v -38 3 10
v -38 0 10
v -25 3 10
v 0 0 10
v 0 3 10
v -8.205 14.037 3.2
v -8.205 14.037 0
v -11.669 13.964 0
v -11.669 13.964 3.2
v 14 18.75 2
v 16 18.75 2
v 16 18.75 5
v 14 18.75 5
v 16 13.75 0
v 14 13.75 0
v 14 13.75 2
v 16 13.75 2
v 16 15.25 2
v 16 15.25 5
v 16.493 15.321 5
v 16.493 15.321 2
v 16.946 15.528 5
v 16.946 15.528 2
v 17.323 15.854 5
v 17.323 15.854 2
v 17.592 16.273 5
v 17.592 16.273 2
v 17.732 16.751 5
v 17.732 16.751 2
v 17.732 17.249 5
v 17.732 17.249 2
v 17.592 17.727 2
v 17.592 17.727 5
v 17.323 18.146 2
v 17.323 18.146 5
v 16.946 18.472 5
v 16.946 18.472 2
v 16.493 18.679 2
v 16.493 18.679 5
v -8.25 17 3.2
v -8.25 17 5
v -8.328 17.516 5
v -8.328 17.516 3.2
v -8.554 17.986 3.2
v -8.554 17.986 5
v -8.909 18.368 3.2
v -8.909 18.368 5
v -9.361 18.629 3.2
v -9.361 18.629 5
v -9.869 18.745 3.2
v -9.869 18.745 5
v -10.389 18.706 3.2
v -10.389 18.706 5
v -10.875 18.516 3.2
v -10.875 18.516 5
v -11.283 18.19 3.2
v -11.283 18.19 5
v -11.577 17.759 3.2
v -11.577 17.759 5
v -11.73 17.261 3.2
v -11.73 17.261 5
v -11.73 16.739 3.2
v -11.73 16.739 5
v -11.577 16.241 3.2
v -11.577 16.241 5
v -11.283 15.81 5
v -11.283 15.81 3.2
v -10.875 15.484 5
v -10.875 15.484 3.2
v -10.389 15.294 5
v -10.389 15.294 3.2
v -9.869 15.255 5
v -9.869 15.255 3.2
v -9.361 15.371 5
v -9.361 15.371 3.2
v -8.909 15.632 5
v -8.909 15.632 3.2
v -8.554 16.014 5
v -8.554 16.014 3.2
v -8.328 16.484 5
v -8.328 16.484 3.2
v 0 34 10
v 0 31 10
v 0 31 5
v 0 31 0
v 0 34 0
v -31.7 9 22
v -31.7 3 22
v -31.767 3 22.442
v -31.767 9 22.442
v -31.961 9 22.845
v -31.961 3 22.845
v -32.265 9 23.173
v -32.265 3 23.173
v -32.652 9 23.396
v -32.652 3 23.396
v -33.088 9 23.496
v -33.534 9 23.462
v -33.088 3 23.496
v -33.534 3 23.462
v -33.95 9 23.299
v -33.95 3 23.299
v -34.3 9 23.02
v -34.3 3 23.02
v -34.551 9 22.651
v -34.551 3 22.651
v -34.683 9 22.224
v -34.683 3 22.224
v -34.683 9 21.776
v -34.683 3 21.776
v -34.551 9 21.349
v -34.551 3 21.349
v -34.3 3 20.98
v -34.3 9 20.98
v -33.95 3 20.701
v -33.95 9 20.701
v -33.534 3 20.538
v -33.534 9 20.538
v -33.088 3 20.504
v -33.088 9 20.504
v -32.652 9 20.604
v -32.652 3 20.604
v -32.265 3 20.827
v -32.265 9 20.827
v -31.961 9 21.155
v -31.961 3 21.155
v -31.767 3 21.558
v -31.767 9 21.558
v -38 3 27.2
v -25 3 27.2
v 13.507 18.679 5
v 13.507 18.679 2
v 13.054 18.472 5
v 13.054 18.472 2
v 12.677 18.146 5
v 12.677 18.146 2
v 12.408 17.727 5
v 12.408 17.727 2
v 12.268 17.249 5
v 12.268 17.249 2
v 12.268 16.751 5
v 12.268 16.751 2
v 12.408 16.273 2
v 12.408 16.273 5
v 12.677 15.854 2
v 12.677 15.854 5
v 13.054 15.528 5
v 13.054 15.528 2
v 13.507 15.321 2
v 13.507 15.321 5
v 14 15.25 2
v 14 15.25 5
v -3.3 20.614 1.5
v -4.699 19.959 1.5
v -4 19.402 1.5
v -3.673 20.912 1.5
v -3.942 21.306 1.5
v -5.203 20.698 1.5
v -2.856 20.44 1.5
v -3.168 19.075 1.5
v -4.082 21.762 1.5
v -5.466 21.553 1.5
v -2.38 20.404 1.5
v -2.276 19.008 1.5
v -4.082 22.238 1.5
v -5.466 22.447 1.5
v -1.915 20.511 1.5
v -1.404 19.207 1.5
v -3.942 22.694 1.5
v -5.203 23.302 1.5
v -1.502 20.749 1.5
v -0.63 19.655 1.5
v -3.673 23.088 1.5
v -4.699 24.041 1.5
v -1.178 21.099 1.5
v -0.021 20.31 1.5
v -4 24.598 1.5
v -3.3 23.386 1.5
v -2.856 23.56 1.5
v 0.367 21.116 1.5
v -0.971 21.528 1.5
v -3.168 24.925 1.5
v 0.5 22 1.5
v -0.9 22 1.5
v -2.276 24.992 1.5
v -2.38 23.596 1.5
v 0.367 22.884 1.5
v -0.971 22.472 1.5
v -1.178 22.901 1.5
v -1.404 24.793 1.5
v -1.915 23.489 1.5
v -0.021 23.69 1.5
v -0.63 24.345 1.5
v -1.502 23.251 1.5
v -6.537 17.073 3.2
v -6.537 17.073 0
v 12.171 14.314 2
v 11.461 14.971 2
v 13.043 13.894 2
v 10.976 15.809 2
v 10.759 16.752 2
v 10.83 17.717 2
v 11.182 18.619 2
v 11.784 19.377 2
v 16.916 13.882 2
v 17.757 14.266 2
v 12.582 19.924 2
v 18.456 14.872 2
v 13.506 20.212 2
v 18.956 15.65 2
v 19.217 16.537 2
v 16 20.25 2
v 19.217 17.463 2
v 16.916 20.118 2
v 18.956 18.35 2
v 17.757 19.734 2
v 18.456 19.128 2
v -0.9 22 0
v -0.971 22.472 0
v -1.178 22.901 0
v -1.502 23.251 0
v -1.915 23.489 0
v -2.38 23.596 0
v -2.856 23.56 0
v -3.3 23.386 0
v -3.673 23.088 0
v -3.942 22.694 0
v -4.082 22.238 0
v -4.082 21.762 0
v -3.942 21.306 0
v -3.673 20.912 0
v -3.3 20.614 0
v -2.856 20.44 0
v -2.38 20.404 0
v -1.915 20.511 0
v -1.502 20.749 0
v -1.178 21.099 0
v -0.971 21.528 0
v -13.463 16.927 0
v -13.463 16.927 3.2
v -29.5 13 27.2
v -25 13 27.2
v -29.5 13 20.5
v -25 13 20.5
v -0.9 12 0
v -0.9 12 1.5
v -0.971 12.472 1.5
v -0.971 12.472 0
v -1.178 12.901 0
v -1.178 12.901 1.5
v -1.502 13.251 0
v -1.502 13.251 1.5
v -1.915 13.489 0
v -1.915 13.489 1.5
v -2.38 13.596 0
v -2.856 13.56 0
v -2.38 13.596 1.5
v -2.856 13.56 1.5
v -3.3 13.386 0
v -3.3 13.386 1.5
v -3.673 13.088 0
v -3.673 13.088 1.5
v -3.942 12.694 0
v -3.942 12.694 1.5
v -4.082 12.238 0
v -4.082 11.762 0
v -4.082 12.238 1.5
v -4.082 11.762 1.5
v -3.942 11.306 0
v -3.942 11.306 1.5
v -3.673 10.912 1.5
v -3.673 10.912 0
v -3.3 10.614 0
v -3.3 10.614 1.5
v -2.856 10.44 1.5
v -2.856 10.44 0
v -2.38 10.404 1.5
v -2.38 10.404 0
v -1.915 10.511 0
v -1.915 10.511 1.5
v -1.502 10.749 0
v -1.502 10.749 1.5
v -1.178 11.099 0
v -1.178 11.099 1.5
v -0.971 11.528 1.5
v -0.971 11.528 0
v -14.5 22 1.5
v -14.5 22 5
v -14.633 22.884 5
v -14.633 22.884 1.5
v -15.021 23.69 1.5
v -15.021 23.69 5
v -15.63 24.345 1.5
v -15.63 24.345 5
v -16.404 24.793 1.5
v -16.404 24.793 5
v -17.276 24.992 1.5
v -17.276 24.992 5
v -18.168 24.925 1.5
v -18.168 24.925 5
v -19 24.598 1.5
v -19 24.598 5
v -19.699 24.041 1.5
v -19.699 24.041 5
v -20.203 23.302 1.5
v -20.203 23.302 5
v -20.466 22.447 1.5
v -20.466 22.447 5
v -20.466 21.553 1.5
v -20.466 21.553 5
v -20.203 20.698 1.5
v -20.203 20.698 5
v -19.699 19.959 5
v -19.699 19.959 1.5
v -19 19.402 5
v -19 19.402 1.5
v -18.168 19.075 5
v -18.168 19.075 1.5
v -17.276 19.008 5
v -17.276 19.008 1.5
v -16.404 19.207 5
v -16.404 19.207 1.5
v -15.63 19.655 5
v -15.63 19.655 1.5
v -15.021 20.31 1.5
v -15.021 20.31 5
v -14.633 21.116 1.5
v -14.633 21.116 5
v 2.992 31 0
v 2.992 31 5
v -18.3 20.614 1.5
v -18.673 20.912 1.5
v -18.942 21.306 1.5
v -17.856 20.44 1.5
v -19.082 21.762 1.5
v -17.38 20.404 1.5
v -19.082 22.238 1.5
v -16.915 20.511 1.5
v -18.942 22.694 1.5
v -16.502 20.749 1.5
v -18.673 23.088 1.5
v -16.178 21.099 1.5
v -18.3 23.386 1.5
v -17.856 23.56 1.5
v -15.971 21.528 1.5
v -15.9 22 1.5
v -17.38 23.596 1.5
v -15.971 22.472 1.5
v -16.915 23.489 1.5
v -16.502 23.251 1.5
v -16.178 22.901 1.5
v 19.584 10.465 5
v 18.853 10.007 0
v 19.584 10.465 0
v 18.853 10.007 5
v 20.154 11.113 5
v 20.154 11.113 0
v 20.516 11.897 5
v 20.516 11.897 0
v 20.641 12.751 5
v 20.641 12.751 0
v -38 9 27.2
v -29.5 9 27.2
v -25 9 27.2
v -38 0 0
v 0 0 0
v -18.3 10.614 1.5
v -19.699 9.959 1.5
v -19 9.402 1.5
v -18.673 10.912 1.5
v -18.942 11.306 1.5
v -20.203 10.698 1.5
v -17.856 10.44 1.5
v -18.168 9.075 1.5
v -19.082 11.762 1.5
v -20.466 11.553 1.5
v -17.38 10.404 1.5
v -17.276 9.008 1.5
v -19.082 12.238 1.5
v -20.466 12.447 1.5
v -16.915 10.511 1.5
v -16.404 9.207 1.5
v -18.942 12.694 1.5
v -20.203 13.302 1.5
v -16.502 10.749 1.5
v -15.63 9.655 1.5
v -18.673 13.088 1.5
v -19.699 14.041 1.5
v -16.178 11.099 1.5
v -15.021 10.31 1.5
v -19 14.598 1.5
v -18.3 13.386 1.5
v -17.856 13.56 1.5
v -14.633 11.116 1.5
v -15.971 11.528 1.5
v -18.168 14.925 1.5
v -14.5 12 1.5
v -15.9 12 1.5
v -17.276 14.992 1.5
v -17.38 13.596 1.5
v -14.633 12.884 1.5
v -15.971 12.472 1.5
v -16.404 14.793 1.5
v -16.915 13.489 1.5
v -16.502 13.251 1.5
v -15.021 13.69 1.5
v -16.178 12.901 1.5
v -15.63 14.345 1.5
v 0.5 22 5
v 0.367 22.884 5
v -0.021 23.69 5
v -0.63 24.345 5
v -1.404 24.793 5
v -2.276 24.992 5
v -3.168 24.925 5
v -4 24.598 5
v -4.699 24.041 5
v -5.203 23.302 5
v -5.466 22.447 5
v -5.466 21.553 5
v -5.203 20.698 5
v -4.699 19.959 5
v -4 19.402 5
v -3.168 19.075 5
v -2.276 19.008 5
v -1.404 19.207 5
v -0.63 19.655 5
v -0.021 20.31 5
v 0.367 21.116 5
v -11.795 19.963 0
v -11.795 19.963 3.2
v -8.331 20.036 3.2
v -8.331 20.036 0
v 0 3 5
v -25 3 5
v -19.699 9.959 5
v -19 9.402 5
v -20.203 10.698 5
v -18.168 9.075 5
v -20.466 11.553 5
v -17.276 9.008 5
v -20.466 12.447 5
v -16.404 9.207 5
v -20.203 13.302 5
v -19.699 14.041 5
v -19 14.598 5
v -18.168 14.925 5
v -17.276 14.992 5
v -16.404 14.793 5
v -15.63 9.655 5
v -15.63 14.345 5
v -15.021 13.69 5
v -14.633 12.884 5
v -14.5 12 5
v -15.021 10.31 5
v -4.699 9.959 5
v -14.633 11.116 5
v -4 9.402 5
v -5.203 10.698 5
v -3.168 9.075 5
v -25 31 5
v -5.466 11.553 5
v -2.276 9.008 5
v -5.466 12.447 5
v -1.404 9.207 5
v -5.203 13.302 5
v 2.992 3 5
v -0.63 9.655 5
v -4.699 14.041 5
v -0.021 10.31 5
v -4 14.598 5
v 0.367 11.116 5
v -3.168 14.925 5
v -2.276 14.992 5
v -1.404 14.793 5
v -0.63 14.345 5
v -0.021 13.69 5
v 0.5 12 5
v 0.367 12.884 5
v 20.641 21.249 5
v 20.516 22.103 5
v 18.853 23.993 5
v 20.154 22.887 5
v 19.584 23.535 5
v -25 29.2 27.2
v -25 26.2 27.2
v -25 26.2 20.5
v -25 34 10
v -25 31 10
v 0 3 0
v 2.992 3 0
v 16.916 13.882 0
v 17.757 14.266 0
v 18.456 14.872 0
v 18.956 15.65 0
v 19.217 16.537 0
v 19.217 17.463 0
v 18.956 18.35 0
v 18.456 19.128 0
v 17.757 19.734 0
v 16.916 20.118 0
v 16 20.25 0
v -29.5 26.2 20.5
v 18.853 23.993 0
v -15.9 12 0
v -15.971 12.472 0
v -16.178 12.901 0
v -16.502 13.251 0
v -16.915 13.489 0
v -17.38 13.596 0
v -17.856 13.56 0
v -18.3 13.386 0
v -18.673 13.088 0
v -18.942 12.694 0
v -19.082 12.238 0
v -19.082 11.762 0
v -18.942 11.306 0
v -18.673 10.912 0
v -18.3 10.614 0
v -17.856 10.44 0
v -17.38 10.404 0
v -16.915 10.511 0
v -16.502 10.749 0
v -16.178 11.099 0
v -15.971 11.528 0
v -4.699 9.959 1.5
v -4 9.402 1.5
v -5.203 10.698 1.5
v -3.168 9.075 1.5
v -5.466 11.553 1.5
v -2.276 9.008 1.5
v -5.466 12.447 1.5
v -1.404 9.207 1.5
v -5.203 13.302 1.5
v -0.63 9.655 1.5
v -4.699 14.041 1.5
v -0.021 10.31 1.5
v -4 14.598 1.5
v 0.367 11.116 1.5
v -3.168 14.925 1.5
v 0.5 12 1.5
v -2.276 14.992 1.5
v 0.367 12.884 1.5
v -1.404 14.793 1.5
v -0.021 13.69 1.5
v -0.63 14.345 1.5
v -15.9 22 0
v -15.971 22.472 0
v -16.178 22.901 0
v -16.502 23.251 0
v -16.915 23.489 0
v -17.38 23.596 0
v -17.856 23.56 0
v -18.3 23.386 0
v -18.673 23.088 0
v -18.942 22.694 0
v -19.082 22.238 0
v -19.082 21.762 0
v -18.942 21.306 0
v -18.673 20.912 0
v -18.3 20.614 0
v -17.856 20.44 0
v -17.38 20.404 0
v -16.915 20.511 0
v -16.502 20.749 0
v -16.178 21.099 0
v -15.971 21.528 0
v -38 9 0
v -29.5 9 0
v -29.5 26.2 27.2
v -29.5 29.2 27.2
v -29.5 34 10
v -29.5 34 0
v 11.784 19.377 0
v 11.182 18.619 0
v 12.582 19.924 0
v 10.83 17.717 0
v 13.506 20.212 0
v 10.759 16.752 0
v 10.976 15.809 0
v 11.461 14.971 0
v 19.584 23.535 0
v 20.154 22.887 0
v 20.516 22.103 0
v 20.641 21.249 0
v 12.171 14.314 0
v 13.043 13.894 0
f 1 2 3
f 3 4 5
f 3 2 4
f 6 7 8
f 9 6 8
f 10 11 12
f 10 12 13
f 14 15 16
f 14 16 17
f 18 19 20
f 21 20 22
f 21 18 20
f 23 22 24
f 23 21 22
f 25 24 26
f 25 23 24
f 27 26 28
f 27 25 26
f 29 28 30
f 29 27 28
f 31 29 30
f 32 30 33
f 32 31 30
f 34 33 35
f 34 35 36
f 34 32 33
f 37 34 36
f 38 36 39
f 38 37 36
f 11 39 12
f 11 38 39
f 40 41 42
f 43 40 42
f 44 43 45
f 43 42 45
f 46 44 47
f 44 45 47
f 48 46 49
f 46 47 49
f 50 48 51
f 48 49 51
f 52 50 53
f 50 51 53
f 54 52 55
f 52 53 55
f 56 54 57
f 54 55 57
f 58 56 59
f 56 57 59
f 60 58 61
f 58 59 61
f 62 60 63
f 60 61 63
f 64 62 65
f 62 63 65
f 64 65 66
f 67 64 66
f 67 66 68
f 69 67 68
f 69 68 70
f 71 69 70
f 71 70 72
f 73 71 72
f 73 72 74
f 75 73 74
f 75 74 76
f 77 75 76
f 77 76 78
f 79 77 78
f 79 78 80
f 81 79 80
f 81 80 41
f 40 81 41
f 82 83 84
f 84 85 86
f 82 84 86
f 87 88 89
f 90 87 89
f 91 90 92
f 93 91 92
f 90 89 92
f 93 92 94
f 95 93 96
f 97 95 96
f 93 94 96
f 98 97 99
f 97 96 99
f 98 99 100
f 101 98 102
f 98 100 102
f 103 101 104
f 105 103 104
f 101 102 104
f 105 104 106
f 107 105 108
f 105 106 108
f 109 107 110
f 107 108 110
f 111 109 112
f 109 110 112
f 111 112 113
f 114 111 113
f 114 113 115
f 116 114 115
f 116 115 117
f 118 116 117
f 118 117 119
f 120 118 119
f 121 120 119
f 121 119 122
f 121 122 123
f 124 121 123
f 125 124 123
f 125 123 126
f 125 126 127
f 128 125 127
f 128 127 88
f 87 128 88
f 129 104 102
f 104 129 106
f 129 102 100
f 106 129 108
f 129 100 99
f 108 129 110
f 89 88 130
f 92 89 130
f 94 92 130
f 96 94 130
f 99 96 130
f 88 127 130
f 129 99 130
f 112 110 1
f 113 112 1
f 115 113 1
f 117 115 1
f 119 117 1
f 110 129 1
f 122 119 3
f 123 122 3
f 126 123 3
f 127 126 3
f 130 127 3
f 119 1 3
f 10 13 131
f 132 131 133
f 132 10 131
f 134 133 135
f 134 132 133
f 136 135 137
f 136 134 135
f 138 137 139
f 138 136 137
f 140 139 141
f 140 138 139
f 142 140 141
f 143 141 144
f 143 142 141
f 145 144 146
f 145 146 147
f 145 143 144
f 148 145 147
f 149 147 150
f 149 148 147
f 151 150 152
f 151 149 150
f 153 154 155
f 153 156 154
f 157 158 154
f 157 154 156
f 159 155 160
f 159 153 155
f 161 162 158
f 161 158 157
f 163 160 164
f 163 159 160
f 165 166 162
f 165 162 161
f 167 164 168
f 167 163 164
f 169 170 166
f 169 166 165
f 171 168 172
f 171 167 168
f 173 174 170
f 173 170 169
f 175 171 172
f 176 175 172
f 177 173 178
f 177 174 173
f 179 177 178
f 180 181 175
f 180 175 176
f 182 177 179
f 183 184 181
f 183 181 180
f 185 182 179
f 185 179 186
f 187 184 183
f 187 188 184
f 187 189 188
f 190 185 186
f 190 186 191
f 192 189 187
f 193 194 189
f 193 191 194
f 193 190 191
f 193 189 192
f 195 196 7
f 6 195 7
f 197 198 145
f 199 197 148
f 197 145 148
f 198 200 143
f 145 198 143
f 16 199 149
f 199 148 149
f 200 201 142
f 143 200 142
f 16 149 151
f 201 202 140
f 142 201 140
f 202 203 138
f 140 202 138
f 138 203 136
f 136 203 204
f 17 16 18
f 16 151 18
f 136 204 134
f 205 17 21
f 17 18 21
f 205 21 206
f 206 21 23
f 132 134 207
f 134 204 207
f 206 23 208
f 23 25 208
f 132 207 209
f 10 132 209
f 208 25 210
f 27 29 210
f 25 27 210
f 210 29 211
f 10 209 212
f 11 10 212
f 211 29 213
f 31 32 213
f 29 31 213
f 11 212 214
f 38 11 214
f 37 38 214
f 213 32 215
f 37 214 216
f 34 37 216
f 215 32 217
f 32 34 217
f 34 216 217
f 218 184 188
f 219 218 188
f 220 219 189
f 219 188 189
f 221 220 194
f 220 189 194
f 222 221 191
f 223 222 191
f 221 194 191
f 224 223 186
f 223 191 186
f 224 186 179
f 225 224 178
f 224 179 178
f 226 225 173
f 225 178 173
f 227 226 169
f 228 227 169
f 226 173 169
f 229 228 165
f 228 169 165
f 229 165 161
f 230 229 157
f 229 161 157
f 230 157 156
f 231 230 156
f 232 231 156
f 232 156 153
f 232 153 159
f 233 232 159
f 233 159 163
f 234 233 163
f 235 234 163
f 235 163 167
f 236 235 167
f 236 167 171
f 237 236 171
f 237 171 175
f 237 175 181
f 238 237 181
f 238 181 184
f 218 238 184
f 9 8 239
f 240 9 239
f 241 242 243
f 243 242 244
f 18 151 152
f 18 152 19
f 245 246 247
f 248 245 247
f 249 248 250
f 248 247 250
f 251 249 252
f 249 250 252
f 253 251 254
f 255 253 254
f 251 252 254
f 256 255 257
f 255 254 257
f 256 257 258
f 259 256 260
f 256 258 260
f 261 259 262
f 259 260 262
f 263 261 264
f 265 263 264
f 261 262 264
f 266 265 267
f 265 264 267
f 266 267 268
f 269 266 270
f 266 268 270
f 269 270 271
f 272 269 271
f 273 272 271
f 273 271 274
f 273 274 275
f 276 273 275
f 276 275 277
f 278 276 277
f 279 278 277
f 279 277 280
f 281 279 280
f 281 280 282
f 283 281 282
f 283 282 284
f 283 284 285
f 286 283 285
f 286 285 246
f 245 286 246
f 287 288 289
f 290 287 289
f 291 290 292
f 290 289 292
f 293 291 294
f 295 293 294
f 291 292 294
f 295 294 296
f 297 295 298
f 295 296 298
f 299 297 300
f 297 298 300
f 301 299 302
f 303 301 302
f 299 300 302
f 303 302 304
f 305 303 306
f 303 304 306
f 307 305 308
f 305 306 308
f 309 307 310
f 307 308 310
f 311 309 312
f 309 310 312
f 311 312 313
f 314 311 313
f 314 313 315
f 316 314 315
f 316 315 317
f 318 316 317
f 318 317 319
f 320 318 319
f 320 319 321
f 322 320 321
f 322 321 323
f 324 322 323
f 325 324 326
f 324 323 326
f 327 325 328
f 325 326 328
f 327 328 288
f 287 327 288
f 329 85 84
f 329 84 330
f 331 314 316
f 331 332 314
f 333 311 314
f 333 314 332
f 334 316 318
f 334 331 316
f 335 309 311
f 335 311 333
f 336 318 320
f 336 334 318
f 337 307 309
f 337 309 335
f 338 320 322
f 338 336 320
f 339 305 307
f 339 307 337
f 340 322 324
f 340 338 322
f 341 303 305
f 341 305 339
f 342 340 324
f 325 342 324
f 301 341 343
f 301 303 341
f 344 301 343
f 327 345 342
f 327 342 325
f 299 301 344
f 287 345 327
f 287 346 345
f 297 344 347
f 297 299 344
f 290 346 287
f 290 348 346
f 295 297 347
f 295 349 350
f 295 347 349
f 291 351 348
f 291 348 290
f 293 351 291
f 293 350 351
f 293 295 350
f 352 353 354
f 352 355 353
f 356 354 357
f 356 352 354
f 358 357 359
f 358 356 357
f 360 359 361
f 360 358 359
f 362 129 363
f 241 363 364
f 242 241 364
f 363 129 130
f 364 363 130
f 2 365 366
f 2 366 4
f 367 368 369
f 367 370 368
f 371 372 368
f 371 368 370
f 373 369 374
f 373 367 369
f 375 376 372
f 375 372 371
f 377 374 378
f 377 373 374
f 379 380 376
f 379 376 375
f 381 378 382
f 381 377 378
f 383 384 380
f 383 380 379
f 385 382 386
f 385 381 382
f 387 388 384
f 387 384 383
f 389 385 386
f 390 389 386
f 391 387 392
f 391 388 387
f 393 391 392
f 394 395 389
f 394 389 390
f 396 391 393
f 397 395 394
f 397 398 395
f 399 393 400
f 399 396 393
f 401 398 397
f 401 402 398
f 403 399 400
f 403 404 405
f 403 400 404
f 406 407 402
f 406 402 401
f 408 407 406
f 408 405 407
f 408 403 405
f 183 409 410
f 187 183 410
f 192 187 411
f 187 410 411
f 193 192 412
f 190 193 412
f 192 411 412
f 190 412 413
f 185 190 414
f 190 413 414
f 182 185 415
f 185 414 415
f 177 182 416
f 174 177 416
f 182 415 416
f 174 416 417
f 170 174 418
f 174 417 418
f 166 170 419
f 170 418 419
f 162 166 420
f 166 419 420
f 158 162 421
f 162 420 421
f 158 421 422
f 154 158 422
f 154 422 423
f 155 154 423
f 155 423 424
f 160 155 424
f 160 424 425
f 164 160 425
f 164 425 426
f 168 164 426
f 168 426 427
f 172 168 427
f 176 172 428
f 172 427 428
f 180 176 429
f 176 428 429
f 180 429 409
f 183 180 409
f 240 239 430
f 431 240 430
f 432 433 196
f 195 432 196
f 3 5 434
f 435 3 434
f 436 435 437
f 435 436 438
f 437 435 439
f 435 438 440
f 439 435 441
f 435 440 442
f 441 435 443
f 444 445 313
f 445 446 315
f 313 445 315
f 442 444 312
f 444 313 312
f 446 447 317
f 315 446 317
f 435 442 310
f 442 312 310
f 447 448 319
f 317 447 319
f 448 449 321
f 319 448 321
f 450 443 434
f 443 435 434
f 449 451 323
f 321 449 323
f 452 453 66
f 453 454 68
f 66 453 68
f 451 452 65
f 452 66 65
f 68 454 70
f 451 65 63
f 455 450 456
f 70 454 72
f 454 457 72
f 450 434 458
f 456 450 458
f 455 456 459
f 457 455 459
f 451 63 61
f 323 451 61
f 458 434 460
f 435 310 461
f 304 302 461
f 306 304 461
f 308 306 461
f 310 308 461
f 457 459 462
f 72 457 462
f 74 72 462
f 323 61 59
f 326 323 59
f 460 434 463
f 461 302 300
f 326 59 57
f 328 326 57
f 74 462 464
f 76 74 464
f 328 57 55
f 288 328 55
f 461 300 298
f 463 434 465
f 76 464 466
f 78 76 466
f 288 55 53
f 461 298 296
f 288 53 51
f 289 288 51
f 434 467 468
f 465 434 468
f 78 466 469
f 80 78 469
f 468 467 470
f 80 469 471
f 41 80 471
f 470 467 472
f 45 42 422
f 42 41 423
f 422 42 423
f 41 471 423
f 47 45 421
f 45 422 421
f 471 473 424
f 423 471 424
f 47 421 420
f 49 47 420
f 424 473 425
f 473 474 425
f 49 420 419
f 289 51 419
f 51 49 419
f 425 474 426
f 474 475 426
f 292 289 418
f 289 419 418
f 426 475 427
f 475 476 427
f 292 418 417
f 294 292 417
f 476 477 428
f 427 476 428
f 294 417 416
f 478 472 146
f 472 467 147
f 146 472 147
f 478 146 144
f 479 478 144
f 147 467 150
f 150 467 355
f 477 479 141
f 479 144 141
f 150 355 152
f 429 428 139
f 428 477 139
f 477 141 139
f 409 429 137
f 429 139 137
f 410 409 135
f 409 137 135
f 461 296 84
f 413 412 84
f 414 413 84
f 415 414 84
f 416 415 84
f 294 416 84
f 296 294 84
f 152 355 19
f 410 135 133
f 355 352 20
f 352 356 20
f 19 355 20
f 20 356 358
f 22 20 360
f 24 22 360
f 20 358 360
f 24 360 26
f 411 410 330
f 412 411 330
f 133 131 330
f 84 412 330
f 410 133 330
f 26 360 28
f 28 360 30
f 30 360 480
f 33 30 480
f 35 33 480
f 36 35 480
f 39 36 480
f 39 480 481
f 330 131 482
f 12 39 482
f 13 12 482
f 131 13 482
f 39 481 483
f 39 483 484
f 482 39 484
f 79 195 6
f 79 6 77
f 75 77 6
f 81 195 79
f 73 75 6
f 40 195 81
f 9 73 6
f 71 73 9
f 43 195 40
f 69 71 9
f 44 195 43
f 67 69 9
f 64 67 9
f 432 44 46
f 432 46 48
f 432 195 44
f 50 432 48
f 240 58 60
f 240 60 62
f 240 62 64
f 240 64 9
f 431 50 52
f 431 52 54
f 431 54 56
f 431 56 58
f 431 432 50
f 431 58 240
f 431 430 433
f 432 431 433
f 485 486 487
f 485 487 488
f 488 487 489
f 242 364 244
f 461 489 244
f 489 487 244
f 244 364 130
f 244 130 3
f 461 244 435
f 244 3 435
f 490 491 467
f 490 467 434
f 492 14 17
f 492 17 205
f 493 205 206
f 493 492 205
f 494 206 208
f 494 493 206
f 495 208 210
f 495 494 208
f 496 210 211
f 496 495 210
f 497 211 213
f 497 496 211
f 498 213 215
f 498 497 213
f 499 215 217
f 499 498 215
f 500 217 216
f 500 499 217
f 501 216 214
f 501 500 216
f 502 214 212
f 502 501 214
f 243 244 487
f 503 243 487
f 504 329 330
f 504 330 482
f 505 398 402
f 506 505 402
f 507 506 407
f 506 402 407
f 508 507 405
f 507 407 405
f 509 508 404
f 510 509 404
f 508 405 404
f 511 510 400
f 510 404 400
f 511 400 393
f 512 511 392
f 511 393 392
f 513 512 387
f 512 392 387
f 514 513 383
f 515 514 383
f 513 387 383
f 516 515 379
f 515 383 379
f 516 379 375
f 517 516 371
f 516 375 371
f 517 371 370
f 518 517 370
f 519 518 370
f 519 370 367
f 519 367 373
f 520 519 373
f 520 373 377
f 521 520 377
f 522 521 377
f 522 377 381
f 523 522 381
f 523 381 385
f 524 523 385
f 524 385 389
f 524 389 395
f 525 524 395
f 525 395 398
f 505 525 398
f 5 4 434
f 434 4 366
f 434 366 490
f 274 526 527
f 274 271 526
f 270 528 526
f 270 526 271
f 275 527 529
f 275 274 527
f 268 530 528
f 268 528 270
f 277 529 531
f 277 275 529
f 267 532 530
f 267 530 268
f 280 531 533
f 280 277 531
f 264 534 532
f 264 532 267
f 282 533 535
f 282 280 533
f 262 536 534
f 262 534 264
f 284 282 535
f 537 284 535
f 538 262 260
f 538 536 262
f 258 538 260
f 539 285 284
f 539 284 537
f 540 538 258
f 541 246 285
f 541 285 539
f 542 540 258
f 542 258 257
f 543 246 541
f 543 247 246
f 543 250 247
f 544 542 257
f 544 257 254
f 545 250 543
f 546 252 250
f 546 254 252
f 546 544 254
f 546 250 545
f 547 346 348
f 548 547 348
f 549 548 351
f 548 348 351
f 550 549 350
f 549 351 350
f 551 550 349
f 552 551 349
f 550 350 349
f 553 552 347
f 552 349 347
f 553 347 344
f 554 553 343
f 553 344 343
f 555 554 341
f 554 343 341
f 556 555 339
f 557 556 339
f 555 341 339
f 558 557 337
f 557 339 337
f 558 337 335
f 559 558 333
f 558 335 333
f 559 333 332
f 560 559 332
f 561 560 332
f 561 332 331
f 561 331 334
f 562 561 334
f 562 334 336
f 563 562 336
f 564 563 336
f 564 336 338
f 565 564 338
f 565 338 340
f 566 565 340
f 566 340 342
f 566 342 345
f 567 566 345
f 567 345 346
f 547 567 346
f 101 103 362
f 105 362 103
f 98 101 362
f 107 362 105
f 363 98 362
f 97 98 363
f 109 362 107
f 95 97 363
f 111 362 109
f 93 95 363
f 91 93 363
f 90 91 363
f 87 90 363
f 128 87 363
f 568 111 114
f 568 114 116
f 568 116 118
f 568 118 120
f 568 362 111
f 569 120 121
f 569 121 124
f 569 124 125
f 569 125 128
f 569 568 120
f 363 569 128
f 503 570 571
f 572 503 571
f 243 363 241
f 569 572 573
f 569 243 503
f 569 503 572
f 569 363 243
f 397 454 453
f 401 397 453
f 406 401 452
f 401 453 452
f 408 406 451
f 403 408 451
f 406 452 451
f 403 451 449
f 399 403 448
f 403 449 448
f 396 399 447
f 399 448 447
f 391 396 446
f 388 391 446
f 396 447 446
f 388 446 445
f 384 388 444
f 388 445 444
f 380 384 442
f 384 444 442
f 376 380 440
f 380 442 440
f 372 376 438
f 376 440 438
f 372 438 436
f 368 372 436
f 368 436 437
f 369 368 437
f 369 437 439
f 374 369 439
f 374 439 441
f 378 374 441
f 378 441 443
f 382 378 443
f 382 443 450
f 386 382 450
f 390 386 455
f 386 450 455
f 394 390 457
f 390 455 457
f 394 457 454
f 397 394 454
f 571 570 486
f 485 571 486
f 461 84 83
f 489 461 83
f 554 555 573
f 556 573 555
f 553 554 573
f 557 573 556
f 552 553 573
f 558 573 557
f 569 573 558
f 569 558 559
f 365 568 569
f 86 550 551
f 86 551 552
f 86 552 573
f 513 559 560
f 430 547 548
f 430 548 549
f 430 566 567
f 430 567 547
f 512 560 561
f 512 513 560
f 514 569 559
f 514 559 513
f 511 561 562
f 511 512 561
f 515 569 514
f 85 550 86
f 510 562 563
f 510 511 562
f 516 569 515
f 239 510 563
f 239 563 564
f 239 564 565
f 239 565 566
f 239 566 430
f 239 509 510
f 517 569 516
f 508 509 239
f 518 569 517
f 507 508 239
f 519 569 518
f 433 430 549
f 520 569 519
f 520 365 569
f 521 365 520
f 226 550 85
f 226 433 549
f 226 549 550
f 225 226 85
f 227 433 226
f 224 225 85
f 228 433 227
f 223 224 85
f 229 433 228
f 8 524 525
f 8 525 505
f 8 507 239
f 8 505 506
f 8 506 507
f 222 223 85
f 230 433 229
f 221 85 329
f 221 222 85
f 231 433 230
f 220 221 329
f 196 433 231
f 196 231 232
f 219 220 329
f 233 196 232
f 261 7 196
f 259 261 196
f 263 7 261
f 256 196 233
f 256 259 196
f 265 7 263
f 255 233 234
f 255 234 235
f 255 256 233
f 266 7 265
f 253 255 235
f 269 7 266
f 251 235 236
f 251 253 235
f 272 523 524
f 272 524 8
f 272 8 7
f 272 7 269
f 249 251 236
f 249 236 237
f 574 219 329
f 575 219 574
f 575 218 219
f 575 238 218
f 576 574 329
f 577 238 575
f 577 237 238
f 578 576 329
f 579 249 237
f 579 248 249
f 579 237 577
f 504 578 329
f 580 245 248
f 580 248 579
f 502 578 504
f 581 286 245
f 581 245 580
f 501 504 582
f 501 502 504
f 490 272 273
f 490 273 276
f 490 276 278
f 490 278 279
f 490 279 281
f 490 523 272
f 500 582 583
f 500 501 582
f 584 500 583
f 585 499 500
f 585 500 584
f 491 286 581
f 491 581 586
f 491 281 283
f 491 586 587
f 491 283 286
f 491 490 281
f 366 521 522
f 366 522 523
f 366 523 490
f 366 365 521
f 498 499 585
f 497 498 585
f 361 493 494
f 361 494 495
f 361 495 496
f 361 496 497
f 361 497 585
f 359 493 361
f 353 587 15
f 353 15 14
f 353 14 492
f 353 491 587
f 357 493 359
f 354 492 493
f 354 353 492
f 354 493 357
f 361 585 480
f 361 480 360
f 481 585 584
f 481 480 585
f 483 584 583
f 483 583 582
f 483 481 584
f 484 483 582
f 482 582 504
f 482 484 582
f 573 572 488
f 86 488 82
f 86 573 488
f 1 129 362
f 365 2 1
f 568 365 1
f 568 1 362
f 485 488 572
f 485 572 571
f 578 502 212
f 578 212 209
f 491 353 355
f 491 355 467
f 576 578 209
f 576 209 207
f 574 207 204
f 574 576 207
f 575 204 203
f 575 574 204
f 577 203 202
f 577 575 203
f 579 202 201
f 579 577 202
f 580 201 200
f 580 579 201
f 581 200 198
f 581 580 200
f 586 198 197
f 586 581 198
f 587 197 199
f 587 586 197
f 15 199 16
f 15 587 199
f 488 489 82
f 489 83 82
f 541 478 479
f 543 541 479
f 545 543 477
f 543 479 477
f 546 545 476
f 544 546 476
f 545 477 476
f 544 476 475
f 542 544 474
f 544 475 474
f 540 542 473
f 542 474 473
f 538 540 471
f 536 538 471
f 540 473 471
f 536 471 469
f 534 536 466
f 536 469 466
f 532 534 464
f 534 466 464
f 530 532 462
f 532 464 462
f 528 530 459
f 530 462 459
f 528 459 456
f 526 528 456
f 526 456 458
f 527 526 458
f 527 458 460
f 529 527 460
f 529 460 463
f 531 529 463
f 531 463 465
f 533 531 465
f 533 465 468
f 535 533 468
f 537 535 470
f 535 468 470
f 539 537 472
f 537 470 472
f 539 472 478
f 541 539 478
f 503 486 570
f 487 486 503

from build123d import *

# Parameters (mm, degrees)
SKETCH_1_W          = 20
SKETCH_1_H          = 34
EXTRUDE_1_DEPTH     = 5
SKETCH_2_W          = 20
SKETCH_2_H          = 3
EXTRUDE_2_DEPTH     = 5
EXTRUDE_3_DEPTH     = 5
FILLET_1_R          = 3
CUT_EXTRUDE_1_DEPTH = 2
SKETCH_7_R          = 1.6
CUT_EXTRUDE_2_DEPTH = 41.087864079
SKETCH_8_R          = 1.75
CUT_EXTRUDE_3_DEPTH = 41.087864079
CUT_EXTRUDE_5_DEPTH = 3.2
EXTRUDE_17_DEPTH    = 18
SKETCH_14_W         = 13
SKETCH_14_H         = 31
EXTRUDE_18_DEPTH    = 30
SKETCH_15_R         = 1.5
SKETCH_15_W         = 20.470707414
SKETCH_15_H         = 10.803453681
CUT_EXTRUDE_6_DEPTH = 61.249481326
SKETCH_16_W         = 16.444381011
SKETCH_16_H         = 28.281193961
CUT_EXTRUDE_7_DEPTH = 25
SKETCH_17_W         = 5
SKETCH_17_H         = 3
EXTRUDE_19_DEPTH    = 5
SKETCH_18_R         = 3
CUT_EXTRUDE_8_DEPTH = 3.5
SKETCH_19_W         = 4.5
SKETCH_19_H         = 27.2
EXTRUDE_20_DEPTH    = 25
SKETCH_20_W         = 8
SKETCH_20_H         = 13.2
CUT_EXTRUDE_9_DEPTH = 64.078600555


with BuildPart() as part:
    # 草图1 → 凸台-拉伸1 (new body)
    with BuildSketch(Plane.XY):
        with Locations((-10, 17)):
            Rectangle(SKETCH_1_W, SKETCH_1_H)
    extrude(amount=EXTRUDE_1_DEPTH)

    # 草图2 → 凸台-拉伸2 (add)
    with BuildSketch(Plane.XY.offset(5)):
        with Locations((-10, 32.5)):
            Rectangle(SKETCH_2_W, SKETCH_2_H)
        with Locations((-10, 1.5)):
            Rectangle(SKETCH_2_W, SKETCH_2_H)
    extrude(amount=EXTRUDE_2_DEPTH)

    # 草图4 → 凸台-拉伸3 (add)
    with BuildSketch(Plane(origin=(0, 0, 0), x_dir=(-1, 0, 0), z_dir=(0, 0, -1))):
        Polygon((0, 3), (0, 31), (-2.991740991, 31), (-20.640660029, 23.203556304), (-20.640660029, 10.796443696), (-2.991740991, 3), align=None)
        with BuildLine():
            ThreePointArc((-16, 15.25), (-17.75, 17), (-16, 18.75))
            Line((-16, 18.75), (-14, 18.75))
            ThreePointArc((-14, 18.75), (-12.25, 17), (-14, 15.25))
            Line((-14, 15.25), (-16, 15.25))
        make_face(mode=Mode.SUBTRACT)
    extrude(amount=-EXTRUDE_3_DEPTH)

    # 圆角1
    fillet_1_edges = [part.edges().sort_by_distance(p)[0] for p in [
        (20.640660029, 10.796443696, 2.5),
        (20.640660029, 23.203556304, 2.5),
    ]]
    fillet(fillet_1_edges, radius=FILLET_1_R)

    # 草图5 → 切除-拉伸1 (cut)
    with BuildSketch(Plane(origin=(0, 0, 0), x_dir=(-1, 0, 0), z_dir=(0, 0, -1))):
        with BuildLine():
            Line((-16, 20.25), (-13.505814151, 20.212208017))
            ThreePointArc((-13.505814151, 20.212208017), (-10.759461769, 16.75218561), (-14, 13.75))
            Line((-14, 13.75), (-16, 13.75))
            ThreePointArc((-16, 13.75), (-19.25, 17), (-16, 20.25))
        make_face()
    extrude(amount=-CUT_EXTRUDE_1_DEPTH, mode=Mode.SUBTRACT)

    # 草图7 → 切除-拉伸2 (cut, through all)
    with BuildSketch(Plane.XY.offset(5)):
        with Locations((-17.5, 22)):
            Circle(SKETCH_7_R)
        with Locations((-2.5, 22)):
            Circle(SKETCH_7_R)
        with Locations((-2.5, 12)):
            Circle(SKETCH_7_R)
        with Locations((-17.5, 12)):
            Circle(SKETCH_7_R)
    extrude(amount=-CUT_EXTRUDE_2_DEPTH, mode=Mode.SUBTRACT)

    # 草图8 → 切除-拉伸3 (cut, through all)
    with BuildSketch(Plane.XY.offset(5)):
        with Locations((-10, 17)):
            Circle(SKETCH_8_R)
    extrude(amount=-CUT_EXTRUDE_3_DEPTH, mode=Mode.SUBTRACT)

    # 草图9 → 切除-拉伸5 (cut)
    with BuildSketch(Plane(origin=(0, 0, 0), x_dir=(-1, 0, 0), z_dir=(0, 0, -1))):
        Polygon((11.668772273, 13.964345359), (13.463340173, 16.927371861), (11.7945679, 19.963026502), (8.331227727, 20.035654641), (6.536659827, 17.072628139), (8.2054321, 14.036973498), align=None)
    extrude(amount=-CUT_EXTRUDE_5_DEPTH, mode=Mode.SUBTRACT)

    # 草图12 → 凸台-拉伸17 (add)
    with BuildSketch(Plane.ZY.offset(20)):
        Polygon((10, 3), (5, 3), (5, 34), (0, 34), (0, 3), (0, 0), (10, 0), align=None)
    extrude(amount=EXTRUDE_17_DEPTH)

    # 草图14 → 凸台-拉伸18 (add)
    with BuildSketch(Plane.XY.offset(5)):
        with Locations((-31.5, 18.5)):
            Rectangle(SKETCH_14_W, SKETCH_14_H)
    extrude(amount=EXTRUDE_18_DEPTH)

    # 草图15 → 切除-拉伸6 (cut, through all)
    with BuildSketch(Plane.XZ.offset(-3)):
        with Locations((-33.2, 22)):
            Circle(SKETCH_15_R)
        with Locations((-32.765829074, 32.601726841)):
            Rectangle(SKETCH_15_W, SKETCH_15_H)
    extrude(amount=-CUT_EXTRUDE_6_DEPTH, mode=Mode.SUBTRACT)

    # 草图16 → 切除-拉伸7 (cut)
    with BuildSketch(Plane(origin=(0, 34, 0), x_dir=(1, 0, 0), z_dir=(0, 1, 0))):
        with Locations((-33.222190506, -13.05940302)):
            Rectangle(SKETCH_16_W, SKETCH_16_H)
    extrude(amount=-CUT_EXTRUDE_7_DEPTH, mode=Mode.SUBTRACT)

    # 草图17 → 凸台-拉伸19 (add)
    with BuildSketch(Plane.ZY.offset(20)):
        with Locations((7.5, 32.5)):
            Rectangle(SKETCH_17_W, SKETCH_17_H)
    extrude(amount=EXTRUDE_19_DEPTH)

    # 草图18 → 切除-拉伸8 (cut)
    with BuildSketch(Plane.XY.offset(5)):
        with Locations((-17.5, 22)):
            Circle(SKETCH_18_R)
        with Locations((-2.5, 22)):
            Circle(SKETCH_18_R)
        with Locations((-2.5, 12)):
            Circle(SKETCH_18_R)
        with Locations((-17.5, 12)):
            Circle(SKETCH_18_R)
    extrude(amount=-CUT_EXTRUDE_8_DEPTH, mode=Mode.SUBTRACT)

    # 草图19 → 凸台-拉伸20 (add)
    with BuildSketch(Plane(origin=(0, 9, 0), x_dir=(1, 0, 0), z_dir=(0, 1, 0))):
        with Locations((-27.25, -13.6)):
            Rectangle(SKETCH_19_W, SKETCH_19_H)
    extrude(amount=EXTRUDE_20_DEPTH)

    # 草图20 → 切除-拉伸9 (cut, through all)
    with BuildSketch(Plane(origin=(-25, 0, 0), x_dir=(0, 0, -1), z_dir=(1, 0, 0))):
        with Locations((-24.5, 19.6)):
            Rectangle(SKETCH_20_W, SKETCH_20_H)
        Polygon((-10, 34), (-27.2, 29.2), (-27.2, 34), align=None)
    extrude(amount=-CUT_EXTRUDE_9_DEPTH, mode=Mode.SUBTRACT)


solid = part.part
